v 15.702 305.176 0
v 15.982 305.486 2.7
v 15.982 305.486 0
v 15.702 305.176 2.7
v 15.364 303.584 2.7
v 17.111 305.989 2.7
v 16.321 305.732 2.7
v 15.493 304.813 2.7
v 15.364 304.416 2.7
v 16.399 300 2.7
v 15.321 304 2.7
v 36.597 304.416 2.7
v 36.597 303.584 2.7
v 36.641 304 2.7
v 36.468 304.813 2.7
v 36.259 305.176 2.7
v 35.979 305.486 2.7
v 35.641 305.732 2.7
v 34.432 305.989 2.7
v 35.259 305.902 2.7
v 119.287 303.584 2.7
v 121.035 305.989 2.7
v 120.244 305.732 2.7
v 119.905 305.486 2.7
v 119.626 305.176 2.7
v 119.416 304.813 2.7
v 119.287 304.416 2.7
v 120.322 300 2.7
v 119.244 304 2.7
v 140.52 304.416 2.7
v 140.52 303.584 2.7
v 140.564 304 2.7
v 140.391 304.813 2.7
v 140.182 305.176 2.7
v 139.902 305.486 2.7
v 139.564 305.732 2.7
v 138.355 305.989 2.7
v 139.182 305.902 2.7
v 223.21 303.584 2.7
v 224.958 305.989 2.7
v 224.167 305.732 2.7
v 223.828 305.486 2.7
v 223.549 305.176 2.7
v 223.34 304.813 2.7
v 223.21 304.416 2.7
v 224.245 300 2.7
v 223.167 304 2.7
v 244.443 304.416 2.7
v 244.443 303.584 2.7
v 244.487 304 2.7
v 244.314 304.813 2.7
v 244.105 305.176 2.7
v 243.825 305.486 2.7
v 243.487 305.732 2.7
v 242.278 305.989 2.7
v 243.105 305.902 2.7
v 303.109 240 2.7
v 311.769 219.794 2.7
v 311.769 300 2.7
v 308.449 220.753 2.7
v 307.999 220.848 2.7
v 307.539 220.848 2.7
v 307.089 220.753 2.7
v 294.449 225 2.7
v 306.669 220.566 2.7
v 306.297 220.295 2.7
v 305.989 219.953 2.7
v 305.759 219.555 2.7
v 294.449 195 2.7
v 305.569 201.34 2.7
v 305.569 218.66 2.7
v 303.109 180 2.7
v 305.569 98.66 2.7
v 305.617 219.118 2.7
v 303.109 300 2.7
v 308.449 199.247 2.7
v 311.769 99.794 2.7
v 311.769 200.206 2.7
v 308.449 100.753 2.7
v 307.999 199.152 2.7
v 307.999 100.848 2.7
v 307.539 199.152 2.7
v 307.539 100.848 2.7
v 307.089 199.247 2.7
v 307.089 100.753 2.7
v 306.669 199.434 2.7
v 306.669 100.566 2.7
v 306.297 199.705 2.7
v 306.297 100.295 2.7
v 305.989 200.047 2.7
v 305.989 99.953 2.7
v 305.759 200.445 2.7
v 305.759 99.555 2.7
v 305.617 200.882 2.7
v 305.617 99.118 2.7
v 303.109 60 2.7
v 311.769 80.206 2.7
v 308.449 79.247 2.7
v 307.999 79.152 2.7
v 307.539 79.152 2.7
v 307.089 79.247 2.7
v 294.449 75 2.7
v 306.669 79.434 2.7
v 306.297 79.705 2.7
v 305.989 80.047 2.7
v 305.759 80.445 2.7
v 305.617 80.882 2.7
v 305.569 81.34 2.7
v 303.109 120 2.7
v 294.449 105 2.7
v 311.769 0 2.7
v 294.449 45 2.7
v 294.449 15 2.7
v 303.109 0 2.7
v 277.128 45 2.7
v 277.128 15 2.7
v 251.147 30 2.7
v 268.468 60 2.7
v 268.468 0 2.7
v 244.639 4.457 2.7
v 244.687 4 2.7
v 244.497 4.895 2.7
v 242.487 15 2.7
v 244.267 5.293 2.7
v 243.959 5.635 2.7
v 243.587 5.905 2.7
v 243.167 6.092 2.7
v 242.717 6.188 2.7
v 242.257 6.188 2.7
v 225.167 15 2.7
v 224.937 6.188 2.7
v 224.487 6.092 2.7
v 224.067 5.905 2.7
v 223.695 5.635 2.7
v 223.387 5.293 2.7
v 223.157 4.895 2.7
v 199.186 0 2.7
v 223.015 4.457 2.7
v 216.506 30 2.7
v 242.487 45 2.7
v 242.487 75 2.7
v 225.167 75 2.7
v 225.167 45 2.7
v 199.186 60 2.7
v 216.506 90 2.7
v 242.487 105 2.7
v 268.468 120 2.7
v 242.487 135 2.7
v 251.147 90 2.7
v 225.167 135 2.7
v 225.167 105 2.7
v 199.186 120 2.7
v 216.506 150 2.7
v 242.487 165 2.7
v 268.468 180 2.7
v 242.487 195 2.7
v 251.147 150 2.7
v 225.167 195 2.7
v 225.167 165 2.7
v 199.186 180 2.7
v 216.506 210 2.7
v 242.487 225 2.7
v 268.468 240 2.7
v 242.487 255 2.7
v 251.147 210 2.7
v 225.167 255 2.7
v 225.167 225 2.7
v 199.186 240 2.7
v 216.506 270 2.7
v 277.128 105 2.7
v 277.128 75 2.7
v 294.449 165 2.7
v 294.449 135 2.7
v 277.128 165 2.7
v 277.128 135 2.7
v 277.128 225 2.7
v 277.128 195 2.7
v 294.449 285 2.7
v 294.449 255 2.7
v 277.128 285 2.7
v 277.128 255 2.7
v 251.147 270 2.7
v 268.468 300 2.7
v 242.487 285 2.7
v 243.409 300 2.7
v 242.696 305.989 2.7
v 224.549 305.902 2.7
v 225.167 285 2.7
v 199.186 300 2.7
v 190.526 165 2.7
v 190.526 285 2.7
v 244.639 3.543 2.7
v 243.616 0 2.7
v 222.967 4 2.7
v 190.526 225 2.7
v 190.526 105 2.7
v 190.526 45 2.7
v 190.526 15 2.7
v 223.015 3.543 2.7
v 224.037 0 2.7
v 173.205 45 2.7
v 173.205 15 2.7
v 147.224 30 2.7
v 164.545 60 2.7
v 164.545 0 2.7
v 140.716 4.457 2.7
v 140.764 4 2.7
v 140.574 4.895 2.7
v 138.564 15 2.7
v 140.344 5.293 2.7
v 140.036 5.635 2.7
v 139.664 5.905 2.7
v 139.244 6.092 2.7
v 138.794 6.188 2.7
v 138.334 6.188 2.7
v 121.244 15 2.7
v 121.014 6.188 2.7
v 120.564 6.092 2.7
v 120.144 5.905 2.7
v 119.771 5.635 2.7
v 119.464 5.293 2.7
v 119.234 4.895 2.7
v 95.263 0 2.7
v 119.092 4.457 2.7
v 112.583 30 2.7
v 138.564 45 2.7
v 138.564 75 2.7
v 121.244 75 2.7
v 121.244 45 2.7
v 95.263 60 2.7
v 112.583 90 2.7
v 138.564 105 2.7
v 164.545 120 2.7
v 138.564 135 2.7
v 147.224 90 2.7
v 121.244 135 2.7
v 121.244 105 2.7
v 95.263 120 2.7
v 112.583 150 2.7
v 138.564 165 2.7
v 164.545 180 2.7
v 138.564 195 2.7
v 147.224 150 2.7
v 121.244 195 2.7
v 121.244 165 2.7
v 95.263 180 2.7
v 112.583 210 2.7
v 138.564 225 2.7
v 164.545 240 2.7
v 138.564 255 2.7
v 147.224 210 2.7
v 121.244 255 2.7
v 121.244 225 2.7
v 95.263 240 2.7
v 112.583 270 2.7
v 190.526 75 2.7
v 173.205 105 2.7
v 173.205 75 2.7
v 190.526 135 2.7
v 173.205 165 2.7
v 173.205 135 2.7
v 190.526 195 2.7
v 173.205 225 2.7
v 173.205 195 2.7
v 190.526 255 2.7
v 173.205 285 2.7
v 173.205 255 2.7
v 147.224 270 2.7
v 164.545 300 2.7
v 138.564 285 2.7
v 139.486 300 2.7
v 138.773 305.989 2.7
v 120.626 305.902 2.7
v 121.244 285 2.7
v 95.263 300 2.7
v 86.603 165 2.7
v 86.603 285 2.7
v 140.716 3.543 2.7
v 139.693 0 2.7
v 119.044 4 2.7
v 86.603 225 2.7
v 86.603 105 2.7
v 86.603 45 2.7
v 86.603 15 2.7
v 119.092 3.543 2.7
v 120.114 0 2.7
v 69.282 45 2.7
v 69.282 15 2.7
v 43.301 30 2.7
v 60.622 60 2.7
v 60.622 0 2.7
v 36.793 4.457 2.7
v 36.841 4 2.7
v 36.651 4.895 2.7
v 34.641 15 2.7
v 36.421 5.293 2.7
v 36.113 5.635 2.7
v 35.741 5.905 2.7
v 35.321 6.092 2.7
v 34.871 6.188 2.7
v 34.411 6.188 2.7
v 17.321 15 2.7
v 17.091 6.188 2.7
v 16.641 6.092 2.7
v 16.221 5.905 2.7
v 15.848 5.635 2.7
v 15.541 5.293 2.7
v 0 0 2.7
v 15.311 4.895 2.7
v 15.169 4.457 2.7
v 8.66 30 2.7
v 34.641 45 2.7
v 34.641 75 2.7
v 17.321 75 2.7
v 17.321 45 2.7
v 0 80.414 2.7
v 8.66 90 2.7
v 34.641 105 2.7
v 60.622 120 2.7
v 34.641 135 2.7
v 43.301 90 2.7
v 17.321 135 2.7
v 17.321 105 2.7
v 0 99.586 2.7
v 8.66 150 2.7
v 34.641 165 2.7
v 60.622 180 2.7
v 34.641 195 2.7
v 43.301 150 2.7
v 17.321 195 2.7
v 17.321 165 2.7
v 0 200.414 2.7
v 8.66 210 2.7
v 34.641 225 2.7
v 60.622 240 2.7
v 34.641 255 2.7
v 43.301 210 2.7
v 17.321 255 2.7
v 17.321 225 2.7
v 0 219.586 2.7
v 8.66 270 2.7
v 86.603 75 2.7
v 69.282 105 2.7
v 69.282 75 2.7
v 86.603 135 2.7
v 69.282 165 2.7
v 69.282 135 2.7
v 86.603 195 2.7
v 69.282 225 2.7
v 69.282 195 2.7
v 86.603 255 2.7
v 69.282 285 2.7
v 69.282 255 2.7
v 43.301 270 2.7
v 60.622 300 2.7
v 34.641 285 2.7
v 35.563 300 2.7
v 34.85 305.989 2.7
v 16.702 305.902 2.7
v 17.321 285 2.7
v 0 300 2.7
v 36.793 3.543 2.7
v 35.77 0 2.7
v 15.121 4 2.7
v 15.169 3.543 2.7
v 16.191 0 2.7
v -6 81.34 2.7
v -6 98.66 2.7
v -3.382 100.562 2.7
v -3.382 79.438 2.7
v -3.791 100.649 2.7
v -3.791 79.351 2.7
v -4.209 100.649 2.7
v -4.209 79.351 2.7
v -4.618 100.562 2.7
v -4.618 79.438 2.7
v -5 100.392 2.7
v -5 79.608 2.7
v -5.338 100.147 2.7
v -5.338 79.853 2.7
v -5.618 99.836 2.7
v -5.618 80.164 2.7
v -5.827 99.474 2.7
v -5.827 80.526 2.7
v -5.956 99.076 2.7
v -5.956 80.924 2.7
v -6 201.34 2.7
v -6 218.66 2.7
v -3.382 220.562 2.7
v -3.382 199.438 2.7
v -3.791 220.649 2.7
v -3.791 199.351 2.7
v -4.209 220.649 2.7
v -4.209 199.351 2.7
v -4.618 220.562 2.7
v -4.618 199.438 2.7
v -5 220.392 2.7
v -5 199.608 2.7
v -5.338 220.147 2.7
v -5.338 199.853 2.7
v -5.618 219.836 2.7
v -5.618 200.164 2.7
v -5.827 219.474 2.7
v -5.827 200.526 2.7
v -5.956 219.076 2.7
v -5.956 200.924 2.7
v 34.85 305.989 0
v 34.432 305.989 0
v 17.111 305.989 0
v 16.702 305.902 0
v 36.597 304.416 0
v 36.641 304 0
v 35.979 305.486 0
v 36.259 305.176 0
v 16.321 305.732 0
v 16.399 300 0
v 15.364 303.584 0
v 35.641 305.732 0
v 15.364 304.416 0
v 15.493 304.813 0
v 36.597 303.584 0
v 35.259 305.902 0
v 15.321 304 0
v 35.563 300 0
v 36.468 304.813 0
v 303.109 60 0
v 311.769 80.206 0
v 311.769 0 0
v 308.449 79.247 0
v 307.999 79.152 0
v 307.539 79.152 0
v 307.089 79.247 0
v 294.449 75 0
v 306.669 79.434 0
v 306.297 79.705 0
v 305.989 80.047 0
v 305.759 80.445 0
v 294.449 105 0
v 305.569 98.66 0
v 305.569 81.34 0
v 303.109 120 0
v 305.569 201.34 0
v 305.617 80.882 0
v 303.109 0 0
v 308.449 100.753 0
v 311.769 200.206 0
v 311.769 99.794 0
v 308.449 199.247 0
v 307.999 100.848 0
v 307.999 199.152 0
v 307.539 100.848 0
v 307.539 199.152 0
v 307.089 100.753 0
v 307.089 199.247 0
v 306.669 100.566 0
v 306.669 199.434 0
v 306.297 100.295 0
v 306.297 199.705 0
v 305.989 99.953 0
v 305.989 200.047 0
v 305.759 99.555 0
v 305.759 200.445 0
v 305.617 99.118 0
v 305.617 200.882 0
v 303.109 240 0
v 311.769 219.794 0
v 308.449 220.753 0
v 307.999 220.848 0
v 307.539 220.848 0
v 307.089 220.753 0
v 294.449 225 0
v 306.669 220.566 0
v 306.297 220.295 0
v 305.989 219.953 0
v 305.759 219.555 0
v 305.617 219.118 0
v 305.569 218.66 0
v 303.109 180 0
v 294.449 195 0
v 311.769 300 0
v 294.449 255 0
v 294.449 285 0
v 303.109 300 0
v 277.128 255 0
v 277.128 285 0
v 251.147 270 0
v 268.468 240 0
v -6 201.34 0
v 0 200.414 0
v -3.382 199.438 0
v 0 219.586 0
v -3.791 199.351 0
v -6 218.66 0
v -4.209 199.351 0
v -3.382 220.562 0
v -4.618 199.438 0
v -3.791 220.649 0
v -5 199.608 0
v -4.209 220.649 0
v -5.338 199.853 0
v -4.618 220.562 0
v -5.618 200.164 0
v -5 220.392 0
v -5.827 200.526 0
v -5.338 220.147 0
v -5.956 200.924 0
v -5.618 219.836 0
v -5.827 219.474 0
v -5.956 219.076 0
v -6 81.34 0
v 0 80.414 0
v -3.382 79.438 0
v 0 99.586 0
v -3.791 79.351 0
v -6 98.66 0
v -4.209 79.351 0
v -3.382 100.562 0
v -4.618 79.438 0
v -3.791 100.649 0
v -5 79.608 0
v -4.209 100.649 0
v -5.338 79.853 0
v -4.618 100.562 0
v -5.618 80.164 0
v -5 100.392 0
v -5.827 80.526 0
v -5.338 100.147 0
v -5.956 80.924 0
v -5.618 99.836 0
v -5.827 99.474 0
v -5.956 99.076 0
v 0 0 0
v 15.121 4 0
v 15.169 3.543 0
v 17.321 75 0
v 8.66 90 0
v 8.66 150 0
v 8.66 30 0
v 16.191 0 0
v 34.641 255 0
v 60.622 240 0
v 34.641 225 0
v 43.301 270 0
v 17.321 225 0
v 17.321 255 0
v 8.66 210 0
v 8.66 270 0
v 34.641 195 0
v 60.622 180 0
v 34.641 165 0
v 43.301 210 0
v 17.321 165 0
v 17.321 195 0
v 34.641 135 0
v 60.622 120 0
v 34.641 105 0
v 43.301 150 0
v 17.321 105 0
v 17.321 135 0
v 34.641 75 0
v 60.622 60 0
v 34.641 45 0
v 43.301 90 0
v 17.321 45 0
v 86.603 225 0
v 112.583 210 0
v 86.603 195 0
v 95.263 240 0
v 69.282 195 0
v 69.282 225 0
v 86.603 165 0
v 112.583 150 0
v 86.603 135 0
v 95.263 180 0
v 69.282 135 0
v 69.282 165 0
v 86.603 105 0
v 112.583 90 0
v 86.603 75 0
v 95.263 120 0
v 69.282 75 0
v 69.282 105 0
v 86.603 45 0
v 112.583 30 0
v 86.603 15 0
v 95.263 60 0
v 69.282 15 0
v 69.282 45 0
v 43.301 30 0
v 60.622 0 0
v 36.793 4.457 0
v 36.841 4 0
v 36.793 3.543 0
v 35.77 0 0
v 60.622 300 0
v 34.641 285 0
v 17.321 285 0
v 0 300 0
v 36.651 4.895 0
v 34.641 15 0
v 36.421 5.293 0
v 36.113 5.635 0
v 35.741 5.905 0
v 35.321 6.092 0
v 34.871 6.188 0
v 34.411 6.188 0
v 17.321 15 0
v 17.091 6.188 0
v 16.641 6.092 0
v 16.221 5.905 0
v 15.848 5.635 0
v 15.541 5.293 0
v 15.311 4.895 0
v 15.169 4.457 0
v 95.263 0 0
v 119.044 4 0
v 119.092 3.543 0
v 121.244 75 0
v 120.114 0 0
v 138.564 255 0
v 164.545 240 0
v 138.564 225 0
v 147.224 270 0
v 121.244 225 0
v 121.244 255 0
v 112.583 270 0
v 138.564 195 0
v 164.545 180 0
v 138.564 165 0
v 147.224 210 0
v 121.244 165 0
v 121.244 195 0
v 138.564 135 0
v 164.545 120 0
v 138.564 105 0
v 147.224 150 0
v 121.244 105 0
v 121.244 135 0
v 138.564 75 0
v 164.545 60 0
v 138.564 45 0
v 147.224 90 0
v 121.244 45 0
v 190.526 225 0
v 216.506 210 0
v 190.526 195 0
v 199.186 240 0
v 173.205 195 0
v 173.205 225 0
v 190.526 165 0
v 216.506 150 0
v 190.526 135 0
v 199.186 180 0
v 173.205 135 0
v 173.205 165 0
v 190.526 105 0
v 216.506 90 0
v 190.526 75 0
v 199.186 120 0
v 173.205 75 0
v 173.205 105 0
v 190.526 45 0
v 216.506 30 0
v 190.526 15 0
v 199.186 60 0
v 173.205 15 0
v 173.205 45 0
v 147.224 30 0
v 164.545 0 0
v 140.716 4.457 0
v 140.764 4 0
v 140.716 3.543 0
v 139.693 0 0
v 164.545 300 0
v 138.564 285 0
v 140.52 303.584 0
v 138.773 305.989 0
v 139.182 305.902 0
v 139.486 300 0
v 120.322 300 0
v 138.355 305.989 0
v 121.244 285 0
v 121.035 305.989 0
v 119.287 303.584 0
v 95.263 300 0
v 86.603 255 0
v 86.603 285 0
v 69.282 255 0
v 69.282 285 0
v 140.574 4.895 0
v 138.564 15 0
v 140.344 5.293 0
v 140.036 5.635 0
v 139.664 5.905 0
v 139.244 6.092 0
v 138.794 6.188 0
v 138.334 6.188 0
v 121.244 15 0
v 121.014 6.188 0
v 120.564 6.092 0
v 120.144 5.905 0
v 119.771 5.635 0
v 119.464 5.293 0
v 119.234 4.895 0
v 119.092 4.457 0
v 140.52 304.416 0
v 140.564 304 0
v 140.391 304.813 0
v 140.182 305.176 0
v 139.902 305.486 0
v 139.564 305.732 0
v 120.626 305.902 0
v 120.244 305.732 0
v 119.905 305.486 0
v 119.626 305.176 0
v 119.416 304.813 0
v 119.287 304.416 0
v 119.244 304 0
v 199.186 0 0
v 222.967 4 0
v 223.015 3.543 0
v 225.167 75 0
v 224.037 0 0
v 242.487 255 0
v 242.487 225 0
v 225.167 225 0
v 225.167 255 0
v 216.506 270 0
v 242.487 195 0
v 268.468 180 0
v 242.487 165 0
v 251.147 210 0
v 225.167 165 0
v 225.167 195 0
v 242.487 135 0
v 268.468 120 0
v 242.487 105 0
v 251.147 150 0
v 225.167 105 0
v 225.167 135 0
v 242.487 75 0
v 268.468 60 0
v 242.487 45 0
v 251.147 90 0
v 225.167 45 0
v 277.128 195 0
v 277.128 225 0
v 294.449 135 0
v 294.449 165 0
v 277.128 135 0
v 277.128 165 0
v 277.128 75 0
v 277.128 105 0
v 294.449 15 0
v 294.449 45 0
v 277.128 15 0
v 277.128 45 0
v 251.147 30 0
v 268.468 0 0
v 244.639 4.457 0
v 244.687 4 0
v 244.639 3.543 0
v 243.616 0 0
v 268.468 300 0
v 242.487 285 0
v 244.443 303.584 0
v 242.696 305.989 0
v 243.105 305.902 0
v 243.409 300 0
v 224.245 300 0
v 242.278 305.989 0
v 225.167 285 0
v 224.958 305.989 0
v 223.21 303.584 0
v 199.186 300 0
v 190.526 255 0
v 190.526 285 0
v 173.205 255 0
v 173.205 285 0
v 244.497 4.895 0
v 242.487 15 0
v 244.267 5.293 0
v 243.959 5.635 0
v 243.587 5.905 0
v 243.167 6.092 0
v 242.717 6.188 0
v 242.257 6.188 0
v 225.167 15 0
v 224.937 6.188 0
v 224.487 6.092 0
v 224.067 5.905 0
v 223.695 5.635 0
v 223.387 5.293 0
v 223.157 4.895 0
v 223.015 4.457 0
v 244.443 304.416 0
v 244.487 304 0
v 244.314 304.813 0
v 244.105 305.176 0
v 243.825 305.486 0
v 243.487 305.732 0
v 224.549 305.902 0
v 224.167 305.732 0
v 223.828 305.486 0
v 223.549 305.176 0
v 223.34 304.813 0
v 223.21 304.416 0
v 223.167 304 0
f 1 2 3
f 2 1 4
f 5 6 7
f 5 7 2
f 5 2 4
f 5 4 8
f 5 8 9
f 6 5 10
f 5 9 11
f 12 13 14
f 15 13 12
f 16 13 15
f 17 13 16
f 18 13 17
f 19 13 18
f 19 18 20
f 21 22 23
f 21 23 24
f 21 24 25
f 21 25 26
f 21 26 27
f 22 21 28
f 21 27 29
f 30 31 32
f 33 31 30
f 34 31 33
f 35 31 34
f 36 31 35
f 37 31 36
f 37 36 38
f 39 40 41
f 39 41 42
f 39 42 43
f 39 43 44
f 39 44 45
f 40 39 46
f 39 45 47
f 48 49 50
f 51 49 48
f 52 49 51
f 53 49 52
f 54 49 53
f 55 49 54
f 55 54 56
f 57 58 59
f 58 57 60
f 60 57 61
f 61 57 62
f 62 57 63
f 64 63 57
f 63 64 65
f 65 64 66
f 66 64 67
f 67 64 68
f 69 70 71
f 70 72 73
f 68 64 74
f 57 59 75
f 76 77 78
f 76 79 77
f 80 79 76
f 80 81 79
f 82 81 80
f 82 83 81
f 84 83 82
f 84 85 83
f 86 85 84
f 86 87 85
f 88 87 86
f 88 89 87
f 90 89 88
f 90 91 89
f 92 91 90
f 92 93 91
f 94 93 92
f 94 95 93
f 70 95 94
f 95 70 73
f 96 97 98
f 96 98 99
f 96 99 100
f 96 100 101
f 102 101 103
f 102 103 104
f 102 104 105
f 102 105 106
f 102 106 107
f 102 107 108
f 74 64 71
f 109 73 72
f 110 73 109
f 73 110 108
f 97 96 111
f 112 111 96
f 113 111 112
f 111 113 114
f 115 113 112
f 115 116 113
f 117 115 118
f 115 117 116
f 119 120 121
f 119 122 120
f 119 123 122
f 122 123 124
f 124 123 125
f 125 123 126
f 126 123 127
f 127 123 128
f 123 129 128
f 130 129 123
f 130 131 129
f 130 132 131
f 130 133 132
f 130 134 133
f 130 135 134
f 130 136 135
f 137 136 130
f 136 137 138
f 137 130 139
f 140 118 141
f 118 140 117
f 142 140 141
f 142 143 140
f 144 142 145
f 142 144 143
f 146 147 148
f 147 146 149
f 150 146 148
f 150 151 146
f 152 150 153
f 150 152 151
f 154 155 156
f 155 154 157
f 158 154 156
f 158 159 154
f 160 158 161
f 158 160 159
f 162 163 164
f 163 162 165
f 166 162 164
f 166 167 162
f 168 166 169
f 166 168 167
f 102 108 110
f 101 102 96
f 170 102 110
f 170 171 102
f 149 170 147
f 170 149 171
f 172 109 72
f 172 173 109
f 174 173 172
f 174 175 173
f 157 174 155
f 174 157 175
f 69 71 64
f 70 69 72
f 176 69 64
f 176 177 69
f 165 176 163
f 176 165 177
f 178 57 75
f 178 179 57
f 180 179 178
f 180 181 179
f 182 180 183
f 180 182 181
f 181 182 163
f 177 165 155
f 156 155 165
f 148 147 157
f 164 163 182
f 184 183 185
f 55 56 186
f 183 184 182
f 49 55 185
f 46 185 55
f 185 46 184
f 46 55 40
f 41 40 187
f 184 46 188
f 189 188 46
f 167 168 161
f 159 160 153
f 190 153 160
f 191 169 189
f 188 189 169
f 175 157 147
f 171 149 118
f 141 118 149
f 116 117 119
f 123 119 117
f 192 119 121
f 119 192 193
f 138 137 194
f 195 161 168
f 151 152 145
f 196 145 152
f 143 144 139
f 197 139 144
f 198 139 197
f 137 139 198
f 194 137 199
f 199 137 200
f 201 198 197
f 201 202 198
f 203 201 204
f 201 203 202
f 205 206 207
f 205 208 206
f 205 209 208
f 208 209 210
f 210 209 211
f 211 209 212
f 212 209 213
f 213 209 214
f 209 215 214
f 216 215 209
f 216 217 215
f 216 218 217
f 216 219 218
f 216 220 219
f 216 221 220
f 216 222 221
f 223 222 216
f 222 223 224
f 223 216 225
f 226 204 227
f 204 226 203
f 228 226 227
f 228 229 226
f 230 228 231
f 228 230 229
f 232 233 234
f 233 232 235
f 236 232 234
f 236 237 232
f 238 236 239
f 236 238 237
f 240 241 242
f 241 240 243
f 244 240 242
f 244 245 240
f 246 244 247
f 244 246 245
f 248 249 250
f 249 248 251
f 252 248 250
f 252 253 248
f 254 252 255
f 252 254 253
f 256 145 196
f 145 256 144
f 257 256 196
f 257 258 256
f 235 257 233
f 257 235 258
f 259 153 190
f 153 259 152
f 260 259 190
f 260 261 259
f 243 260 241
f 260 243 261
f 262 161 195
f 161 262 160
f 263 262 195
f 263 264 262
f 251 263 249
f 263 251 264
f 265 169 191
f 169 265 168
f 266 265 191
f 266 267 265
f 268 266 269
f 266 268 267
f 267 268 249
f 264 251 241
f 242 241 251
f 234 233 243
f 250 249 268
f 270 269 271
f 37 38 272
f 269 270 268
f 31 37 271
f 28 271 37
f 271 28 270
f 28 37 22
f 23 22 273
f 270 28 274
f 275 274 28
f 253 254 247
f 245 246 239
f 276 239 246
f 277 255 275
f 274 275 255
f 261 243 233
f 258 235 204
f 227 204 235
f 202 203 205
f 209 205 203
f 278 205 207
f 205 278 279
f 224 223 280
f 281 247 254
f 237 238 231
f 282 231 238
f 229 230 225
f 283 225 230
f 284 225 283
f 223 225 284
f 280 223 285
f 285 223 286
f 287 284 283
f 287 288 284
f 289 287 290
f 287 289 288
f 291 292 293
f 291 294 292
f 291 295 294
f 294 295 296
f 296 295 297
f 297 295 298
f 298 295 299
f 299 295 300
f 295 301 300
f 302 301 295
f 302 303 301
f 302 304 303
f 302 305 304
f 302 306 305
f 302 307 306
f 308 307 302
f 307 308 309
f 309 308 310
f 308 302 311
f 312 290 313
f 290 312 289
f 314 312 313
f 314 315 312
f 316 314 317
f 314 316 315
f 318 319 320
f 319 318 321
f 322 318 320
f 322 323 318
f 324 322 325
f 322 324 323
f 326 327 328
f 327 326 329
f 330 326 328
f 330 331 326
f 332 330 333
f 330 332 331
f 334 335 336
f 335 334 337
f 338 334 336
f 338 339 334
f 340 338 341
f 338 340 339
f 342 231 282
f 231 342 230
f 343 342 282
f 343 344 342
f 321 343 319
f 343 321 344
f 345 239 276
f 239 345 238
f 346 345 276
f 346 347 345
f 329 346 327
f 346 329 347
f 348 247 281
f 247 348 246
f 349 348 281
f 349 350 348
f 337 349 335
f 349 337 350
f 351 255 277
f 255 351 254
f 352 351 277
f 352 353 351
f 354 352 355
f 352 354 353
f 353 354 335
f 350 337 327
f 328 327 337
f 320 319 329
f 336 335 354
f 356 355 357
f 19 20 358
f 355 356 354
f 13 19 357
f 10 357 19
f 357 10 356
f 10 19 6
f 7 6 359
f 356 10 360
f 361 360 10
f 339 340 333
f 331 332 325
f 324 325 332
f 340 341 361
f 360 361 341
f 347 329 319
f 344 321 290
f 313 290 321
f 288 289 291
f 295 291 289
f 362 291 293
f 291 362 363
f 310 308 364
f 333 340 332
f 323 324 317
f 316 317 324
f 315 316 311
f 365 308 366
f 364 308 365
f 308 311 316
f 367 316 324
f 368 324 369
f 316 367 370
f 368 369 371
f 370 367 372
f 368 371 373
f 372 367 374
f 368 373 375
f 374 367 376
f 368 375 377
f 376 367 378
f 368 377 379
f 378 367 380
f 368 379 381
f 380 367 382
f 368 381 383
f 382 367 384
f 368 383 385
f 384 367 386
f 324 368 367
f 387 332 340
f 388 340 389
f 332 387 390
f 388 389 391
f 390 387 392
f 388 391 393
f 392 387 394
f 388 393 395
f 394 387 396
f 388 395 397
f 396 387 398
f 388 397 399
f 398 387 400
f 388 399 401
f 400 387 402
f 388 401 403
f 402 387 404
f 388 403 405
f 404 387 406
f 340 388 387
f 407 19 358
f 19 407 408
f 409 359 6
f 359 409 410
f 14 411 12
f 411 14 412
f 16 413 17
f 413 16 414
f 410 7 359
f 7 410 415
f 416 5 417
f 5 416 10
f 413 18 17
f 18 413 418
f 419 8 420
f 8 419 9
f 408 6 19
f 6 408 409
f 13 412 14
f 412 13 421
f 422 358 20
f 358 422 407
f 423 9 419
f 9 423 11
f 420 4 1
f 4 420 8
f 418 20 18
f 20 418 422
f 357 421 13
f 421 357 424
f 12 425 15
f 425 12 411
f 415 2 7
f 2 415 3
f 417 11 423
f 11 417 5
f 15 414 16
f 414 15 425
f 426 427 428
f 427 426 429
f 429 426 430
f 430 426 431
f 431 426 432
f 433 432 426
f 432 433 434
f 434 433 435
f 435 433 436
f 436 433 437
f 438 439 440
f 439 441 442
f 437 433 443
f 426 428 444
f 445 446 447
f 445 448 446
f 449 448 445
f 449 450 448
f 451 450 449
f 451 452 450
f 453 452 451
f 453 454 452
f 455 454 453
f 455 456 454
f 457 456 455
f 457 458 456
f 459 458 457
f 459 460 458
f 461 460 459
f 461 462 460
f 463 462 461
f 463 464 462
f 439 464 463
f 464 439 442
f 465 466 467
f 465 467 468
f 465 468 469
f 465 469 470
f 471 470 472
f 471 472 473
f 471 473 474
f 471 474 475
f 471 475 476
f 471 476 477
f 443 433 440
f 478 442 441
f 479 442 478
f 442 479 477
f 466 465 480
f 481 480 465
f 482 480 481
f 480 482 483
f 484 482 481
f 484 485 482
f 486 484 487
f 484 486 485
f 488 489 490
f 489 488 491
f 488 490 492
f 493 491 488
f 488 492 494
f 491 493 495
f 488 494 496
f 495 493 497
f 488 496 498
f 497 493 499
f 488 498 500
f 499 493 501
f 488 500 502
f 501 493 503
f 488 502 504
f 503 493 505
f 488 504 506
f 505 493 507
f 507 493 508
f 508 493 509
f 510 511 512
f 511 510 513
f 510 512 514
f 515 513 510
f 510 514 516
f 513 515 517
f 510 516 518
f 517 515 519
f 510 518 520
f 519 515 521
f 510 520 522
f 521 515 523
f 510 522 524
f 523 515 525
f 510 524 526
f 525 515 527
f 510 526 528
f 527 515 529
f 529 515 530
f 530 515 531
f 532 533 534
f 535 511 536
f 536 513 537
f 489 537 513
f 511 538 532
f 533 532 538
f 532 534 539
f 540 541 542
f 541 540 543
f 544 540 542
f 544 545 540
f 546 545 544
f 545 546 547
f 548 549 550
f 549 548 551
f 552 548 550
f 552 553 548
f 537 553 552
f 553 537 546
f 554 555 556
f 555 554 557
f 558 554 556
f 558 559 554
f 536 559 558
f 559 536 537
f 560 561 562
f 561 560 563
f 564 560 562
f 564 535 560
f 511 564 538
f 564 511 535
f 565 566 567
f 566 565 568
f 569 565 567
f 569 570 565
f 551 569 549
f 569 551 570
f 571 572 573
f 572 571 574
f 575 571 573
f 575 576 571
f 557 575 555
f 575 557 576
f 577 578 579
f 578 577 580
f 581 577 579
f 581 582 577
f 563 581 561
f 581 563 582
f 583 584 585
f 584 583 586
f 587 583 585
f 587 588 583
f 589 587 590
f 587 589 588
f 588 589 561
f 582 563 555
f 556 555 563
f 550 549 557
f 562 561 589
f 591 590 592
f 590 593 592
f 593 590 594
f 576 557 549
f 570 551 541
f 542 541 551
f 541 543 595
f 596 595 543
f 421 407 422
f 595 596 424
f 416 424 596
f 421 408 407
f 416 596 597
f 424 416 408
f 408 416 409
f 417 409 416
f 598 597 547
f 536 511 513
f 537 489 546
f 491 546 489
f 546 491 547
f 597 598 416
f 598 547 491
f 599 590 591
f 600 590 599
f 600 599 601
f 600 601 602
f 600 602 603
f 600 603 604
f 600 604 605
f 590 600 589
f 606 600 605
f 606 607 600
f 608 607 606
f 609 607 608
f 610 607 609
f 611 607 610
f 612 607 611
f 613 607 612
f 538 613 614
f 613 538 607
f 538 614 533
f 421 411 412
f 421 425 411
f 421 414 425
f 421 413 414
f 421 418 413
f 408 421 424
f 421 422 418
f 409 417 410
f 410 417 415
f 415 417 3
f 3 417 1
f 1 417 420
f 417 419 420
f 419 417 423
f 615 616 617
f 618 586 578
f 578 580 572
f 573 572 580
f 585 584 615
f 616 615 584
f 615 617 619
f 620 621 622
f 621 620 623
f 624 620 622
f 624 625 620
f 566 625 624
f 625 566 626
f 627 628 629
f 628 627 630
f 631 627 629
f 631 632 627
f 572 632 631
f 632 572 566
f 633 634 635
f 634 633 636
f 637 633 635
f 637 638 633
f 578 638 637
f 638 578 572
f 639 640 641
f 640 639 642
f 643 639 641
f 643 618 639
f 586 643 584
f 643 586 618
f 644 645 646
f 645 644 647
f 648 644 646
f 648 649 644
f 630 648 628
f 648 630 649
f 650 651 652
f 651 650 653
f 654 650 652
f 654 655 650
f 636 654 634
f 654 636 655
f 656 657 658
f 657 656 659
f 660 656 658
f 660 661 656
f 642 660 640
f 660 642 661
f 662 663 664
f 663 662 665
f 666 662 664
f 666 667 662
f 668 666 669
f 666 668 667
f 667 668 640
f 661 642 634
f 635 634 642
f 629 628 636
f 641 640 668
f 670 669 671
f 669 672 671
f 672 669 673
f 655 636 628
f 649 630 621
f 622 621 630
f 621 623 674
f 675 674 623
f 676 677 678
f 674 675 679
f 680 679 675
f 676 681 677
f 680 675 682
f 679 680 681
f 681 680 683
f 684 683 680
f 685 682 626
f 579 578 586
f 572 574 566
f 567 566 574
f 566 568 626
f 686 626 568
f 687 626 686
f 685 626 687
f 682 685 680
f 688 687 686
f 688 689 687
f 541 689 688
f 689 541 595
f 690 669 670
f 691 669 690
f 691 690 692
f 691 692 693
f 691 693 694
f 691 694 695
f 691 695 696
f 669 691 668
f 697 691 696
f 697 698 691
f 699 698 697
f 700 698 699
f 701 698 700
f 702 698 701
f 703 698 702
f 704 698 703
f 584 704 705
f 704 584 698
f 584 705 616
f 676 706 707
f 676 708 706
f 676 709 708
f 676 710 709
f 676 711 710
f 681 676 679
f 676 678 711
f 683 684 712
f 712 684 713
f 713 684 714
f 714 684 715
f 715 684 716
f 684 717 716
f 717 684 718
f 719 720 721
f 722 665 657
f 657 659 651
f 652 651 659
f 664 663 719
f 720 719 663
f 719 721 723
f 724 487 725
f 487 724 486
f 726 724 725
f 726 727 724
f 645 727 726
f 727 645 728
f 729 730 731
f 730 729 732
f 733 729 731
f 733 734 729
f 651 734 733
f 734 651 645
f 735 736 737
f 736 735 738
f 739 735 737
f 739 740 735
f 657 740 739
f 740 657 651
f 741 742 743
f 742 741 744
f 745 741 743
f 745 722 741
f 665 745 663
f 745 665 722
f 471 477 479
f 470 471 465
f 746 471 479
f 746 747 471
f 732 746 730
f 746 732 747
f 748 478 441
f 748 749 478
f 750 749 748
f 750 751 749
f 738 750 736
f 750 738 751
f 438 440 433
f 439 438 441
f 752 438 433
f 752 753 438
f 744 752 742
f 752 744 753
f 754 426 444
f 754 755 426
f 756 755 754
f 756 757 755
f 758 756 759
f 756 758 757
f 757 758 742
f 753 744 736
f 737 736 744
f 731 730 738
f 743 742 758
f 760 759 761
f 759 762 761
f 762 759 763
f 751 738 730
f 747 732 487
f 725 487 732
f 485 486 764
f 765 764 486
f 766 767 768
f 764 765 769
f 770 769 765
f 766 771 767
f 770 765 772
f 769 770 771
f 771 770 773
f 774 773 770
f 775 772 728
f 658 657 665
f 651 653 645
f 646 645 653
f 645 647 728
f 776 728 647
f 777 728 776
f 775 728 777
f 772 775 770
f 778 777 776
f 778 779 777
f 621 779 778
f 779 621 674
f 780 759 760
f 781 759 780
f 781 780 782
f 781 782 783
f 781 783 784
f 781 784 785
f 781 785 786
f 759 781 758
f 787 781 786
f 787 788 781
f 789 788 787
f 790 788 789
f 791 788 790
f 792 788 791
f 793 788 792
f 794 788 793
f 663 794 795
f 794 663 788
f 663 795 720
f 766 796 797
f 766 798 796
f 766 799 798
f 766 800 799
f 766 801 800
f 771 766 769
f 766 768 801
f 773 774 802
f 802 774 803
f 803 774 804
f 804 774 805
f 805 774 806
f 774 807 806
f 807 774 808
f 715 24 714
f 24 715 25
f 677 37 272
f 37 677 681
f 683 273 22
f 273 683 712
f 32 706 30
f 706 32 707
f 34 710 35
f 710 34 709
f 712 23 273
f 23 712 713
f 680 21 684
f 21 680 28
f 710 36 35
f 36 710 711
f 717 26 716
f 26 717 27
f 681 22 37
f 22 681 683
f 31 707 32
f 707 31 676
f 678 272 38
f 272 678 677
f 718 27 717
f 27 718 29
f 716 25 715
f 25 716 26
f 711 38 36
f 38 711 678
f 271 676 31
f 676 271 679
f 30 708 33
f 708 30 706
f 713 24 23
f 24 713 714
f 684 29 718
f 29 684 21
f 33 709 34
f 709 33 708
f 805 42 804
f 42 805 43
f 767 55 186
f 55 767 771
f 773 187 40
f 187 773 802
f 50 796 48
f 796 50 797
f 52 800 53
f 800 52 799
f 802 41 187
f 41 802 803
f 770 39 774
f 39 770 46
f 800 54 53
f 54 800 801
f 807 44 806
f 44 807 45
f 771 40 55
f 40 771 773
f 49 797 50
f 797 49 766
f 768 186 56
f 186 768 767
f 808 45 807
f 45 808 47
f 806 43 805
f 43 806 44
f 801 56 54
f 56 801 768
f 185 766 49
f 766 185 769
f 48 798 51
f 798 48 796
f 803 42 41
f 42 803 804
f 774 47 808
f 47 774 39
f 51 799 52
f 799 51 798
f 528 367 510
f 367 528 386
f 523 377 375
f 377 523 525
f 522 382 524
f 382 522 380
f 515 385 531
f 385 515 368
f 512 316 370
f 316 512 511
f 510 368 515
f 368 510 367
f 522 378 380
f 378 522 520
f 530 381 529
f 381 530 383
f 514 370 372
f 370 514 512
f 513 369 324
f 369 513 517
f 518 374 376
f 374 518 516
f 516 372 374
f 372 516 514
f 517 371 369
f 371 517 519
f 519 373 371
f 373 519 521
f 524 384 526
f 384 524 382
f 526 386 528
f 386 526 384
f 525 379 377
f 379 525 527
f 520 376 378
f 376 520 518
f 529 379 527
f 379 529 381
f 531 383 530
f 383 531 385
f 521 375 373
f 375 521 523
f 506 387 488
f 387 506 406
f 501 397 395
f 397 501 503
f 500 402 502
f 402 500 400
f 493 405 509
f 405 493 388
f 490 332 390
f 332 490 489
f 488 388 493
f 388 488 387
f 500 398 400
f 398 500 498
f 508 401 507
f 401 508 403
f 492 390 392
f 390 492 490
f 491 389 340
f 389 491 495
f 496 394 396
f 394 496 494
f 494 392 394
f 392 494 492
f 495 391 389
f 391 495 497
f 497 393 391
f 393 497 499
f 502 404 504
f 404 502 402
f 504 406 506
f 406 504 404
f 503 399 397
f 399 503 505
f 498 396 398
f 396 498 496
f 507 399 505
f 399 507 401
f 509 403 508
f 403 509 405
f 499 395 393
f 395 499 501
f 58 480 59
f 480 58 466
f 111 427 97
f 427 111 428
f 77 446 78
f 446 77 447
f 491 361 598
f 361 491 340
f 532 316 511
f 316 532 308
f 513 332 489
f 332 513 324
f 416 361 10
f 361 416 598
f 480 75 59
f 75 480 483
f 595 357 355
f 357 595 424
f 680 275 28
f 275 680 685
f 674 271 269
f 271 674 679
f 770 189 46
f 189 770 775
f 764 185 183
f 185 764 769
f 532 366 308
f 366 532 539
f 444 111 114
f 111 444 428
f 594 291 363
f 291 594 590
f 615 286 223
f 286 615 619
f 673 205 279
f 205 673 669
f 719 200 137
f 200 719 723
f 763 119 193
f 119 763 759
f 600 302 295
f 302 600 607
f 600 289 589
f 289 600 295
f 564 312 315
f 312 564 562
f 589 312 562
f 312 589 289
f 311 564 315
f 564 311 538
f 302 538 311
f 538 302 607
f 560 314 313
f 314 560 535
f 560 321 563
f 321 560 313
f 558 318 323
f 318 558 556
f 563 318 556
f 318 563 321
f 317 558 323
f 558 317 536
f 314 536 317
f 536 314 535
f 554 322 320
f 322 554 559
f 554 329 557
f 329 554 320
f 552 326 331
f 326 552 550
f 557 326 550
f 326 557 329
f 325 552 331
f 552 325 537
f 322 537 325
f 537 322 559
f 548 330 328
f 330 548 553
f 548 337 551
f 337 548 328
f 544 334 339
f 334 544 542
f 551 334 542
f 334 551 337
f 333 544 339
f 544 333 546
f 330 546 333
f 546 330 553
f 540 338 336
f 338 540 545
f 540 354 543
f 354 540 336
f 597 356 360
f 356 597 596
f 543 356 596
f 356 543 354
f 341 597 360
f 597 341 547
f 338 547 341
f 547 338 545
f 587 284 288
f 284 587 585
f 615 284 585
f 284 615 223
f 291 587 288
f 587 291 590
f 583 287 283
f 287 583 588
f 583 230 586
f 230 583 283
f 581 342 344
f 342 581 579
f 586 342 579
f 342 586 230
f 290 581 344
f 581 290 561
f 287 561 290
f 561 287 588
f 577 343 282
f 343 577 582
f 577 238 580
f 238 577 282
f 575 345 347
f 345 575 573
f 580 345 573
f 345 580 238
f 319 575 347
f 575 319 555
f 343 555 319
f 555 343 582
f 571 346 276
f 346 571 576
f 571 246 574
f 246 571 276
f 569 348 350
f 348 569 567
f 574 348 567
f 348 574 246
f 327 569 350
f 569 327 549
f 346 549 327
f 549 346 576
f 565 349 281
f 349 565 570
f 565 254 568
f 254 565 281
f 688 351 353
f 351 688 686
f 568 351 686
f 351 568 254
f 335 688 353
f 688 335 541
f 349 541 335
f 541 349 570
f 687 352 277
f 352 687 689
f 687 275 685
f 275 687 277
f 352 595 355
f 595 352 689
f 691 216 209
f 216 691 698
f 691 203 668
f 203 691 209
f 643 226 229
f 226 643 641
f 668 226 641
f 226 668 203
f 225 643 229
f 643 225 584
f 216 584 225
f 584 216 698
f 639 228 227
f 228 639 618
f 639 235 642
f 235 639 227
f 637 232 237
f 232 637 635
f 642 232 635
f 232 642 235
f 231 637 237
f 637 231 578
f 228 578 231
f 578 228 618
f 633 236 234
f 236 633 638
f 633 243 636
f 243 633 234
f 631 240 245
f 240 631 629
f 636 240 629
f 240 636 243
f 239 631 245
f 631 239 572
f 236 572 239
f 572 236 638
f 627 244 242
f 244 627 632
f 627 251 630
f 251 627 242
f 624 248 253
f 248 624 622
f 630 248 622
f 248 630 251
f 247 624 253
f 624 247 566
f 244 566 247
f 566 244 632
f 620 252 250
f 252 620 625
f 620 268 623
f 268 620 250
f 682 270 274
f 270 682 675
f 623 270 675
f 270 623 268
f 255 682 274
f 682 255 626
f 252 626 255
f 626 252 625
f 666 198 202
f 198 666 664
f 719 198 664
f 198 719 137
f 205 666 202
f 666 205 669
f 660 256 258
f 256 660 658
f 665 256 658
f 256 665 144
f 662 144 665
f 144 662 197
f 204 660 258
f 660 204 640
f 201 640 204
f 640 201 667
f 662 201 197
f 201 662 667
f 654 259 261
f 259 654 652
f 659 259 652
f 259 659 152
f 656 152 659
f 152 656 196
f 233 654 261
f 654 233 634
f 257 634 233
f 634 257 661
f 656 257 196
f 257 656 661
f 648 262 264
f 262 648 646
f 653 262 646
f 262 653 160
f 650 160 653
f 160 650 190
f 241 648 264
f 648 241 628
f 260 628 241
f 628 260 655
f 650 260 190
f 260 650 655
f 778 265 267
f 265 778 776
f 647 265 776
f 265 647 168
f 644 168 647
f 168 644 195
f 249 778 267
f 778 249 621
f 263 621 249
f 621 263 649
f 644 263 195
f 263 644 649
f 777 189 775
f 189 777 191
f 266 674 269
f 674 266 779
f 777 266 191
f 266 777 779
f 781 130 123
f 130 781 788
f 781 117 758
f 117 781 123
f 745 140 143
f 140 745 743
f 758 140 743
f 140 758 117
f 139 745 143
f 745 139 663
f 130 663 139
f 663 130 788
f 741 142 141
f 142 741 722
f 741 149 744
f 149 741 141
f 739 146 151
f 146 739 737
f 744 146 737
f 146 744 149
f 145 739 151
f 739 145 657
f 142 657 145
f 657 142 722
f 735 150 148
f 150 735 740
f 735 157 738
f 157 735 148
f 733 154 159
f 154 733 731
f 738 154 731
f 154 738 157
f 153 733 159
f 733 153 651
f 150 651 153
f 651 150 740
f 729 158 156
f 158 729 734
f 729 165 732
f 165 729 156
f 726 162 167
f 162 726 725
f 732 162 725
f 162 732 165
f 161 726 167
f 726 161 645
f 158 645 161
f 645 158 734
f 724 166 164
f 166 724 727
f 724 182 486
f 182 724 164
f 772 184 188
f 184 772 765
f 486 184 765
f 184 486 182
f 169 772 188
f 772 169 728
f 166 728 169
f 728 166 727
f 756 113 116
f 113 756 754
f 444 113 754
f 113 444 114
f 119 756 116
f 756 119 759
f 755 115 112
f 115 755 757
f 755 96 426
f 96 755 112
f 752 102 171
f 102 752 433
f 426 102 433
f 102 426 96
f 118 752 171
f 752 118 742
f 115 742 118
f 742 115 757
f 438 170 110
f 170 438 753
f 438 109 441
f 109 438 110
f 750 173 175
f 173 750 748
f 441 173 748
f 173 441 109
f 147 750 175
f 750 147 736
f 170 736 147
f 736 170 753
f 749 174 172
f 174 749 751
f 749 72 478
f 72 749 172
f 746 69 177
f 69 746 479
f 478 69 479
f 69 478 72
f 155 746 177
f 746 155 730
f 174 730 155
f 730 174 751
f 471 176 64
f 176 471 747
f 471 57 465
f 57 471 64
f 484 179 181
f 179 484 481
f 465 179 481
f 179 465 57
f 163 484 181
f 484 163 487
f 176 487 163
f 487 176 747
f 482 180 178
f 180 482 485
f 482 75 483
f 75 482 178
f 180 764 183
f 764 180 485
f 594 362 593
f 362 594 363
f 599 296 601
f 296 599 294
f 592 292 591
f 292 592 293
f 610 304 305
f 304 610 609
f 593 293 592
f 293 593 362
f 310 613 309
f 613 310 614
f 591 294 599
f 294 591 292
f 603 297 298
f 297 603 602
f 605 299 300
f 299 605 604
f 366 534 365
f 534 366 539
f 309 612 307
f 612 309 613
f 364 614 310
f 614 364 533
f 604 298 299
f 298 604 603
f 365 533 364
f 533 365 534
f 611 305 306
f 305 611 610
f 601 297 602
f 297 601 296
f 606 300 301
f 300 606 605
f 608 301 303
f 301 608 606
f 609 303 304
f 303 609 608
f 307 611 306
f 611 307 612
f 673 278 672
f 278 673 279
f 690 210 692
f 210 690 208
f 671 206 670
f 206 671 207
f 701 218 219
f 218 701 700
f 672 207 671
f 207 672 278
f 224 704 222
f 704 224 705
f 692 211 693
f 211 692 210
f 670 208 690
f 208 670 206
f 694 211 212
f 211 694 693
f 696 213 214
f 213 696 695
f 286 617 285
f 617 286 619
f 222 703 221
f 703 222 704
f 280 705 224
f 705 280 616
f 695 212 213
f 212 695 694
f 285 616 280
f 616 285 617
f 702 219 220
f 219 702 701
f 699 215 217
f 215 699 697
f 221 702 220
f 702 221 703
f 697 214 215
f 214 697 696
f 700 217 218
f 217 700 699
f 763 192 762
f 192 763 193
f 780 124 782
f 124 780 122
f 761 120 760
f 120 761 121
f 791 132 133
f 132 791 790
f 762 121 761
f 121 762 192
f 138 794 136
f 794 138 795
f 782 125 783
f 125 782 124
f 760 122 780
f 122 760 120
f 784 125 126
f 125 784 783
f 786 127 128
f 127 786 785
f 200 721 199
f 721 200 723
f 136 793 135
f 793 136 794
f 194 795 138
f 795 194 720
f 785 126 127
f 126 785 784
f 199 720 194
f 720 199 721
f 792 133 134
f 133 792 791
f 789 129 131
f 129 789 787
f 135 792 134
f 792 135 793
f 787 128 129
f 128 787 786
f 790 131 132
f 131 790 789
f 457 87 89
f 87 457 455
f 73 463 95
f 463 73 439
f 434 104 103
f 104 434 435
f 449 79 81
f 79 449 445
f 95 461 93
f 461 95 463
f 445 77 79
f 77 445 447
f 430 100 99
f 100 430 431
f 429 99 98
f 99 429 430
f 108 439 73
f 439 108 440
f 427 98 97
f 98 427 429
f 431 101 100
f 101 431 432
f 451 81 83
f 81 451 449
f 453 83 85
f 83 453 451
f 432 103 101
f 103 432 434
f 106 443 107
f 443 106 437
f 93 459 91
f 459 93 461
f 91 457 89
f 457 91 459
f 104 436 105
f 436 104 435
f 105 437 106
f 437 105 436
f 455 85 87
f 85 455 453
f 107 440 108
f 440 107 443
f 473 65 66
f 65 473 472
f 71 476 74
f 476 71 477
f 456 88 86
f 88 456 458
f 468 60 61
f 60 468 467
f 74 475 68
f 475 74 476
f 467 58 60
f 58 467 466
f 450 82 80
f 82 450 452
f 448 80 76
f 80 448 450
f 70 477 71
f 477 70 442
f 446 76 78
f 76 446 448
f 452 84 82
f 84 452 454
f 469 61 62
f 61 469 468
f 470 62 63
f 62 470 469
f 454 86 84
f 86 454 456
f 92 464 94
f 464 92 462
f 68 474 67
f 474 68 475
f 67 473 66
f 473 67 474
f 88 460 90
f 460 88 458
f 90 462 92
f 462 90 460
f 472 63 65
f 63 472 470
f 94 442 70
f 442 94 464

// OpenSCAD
// height of baseplate
hbp=2.7;

// hexagonal diameter
dh=30;
lh=tan(30)*dh;echo(radius=lh);

// width
w=6;
// base plate width
wbp=3*w*lh; echo(width=wbp);

// length
l=5;
// base plate length
lbp=2*l*dh; echo(length=lbp);

// minkowski radius
mr=2;

// nozzle width
wn=0.4;

difference()
{
    union()
    {
        color("Silver")
        cube([wbp,lbp,hbp]);

        color("Blue")
        for(xx=[0:w/2-1])
        {
            translate([lh+lh/2+xx*lh*6,lbp-4-mr,0])
            minkowski()
            {
                scale([1,2,1])
                rotate([0,0,30])
                cylinder(h=hbp-1,d=20,$fn=3);
                cylinder(h=1,r=mr,$fn=30);
            };
        };

        color("LightBlue")
        for(xx=[0:w/2-2])
        {
            translate([6,dh*3+xx*4*dh,0])
            minkowski()
            {
                scale([2,1,1])
                rotate([0,0,120])
                cylinder(h=hbp-1,d=20,$fn=3);
                cylinder(h=1,r=mr,$fn=30);
            };
        };
    };

    color("Green")
    for(x=[0:w-1])
    {
        for(y=[0:l])
        {
            if(floor(x/2)==x/2)
                translate([lh+lh/2+3*x*lh,dh+2*y*dh,-hbp/2])
                cylinder(h=2*hbp,d=2*lh,$fn=6);
            else
                translate([lh+lh/2+3*x*lh,2*y*dh,-hbp/2])
                cylinder(h=2*hbp,d=2*lh,$fn=6);

        };
    };

    color("Orange")
    for(xx=[0:w/2-1])
    {
        translate([lh+lh/2+xx*lh*6,-4-mr,-hbp/2])
        minkowski()
        {
            scale([1,2,1])
            rotate([0,0,30])
            cylinder(h=2*hbp,d=20,$fn=3);
            cylinder(h=1,r=mr+wn/2,$fn=30);
        };
    };

    color("Red")
    for(xx=[0:w/2-2])
    {
        translate([wbp+6,dh*3+xx*4*dh,-hbp/2])
        minkowski()
        {
            scale([2,1,1])
            rotate([0,0,120])
            cylinder(h=2*hbp,d=20,$fn=3);
            cylinder(h=1,r=mr+wn/2,$fn=30);
        };
    };


};
